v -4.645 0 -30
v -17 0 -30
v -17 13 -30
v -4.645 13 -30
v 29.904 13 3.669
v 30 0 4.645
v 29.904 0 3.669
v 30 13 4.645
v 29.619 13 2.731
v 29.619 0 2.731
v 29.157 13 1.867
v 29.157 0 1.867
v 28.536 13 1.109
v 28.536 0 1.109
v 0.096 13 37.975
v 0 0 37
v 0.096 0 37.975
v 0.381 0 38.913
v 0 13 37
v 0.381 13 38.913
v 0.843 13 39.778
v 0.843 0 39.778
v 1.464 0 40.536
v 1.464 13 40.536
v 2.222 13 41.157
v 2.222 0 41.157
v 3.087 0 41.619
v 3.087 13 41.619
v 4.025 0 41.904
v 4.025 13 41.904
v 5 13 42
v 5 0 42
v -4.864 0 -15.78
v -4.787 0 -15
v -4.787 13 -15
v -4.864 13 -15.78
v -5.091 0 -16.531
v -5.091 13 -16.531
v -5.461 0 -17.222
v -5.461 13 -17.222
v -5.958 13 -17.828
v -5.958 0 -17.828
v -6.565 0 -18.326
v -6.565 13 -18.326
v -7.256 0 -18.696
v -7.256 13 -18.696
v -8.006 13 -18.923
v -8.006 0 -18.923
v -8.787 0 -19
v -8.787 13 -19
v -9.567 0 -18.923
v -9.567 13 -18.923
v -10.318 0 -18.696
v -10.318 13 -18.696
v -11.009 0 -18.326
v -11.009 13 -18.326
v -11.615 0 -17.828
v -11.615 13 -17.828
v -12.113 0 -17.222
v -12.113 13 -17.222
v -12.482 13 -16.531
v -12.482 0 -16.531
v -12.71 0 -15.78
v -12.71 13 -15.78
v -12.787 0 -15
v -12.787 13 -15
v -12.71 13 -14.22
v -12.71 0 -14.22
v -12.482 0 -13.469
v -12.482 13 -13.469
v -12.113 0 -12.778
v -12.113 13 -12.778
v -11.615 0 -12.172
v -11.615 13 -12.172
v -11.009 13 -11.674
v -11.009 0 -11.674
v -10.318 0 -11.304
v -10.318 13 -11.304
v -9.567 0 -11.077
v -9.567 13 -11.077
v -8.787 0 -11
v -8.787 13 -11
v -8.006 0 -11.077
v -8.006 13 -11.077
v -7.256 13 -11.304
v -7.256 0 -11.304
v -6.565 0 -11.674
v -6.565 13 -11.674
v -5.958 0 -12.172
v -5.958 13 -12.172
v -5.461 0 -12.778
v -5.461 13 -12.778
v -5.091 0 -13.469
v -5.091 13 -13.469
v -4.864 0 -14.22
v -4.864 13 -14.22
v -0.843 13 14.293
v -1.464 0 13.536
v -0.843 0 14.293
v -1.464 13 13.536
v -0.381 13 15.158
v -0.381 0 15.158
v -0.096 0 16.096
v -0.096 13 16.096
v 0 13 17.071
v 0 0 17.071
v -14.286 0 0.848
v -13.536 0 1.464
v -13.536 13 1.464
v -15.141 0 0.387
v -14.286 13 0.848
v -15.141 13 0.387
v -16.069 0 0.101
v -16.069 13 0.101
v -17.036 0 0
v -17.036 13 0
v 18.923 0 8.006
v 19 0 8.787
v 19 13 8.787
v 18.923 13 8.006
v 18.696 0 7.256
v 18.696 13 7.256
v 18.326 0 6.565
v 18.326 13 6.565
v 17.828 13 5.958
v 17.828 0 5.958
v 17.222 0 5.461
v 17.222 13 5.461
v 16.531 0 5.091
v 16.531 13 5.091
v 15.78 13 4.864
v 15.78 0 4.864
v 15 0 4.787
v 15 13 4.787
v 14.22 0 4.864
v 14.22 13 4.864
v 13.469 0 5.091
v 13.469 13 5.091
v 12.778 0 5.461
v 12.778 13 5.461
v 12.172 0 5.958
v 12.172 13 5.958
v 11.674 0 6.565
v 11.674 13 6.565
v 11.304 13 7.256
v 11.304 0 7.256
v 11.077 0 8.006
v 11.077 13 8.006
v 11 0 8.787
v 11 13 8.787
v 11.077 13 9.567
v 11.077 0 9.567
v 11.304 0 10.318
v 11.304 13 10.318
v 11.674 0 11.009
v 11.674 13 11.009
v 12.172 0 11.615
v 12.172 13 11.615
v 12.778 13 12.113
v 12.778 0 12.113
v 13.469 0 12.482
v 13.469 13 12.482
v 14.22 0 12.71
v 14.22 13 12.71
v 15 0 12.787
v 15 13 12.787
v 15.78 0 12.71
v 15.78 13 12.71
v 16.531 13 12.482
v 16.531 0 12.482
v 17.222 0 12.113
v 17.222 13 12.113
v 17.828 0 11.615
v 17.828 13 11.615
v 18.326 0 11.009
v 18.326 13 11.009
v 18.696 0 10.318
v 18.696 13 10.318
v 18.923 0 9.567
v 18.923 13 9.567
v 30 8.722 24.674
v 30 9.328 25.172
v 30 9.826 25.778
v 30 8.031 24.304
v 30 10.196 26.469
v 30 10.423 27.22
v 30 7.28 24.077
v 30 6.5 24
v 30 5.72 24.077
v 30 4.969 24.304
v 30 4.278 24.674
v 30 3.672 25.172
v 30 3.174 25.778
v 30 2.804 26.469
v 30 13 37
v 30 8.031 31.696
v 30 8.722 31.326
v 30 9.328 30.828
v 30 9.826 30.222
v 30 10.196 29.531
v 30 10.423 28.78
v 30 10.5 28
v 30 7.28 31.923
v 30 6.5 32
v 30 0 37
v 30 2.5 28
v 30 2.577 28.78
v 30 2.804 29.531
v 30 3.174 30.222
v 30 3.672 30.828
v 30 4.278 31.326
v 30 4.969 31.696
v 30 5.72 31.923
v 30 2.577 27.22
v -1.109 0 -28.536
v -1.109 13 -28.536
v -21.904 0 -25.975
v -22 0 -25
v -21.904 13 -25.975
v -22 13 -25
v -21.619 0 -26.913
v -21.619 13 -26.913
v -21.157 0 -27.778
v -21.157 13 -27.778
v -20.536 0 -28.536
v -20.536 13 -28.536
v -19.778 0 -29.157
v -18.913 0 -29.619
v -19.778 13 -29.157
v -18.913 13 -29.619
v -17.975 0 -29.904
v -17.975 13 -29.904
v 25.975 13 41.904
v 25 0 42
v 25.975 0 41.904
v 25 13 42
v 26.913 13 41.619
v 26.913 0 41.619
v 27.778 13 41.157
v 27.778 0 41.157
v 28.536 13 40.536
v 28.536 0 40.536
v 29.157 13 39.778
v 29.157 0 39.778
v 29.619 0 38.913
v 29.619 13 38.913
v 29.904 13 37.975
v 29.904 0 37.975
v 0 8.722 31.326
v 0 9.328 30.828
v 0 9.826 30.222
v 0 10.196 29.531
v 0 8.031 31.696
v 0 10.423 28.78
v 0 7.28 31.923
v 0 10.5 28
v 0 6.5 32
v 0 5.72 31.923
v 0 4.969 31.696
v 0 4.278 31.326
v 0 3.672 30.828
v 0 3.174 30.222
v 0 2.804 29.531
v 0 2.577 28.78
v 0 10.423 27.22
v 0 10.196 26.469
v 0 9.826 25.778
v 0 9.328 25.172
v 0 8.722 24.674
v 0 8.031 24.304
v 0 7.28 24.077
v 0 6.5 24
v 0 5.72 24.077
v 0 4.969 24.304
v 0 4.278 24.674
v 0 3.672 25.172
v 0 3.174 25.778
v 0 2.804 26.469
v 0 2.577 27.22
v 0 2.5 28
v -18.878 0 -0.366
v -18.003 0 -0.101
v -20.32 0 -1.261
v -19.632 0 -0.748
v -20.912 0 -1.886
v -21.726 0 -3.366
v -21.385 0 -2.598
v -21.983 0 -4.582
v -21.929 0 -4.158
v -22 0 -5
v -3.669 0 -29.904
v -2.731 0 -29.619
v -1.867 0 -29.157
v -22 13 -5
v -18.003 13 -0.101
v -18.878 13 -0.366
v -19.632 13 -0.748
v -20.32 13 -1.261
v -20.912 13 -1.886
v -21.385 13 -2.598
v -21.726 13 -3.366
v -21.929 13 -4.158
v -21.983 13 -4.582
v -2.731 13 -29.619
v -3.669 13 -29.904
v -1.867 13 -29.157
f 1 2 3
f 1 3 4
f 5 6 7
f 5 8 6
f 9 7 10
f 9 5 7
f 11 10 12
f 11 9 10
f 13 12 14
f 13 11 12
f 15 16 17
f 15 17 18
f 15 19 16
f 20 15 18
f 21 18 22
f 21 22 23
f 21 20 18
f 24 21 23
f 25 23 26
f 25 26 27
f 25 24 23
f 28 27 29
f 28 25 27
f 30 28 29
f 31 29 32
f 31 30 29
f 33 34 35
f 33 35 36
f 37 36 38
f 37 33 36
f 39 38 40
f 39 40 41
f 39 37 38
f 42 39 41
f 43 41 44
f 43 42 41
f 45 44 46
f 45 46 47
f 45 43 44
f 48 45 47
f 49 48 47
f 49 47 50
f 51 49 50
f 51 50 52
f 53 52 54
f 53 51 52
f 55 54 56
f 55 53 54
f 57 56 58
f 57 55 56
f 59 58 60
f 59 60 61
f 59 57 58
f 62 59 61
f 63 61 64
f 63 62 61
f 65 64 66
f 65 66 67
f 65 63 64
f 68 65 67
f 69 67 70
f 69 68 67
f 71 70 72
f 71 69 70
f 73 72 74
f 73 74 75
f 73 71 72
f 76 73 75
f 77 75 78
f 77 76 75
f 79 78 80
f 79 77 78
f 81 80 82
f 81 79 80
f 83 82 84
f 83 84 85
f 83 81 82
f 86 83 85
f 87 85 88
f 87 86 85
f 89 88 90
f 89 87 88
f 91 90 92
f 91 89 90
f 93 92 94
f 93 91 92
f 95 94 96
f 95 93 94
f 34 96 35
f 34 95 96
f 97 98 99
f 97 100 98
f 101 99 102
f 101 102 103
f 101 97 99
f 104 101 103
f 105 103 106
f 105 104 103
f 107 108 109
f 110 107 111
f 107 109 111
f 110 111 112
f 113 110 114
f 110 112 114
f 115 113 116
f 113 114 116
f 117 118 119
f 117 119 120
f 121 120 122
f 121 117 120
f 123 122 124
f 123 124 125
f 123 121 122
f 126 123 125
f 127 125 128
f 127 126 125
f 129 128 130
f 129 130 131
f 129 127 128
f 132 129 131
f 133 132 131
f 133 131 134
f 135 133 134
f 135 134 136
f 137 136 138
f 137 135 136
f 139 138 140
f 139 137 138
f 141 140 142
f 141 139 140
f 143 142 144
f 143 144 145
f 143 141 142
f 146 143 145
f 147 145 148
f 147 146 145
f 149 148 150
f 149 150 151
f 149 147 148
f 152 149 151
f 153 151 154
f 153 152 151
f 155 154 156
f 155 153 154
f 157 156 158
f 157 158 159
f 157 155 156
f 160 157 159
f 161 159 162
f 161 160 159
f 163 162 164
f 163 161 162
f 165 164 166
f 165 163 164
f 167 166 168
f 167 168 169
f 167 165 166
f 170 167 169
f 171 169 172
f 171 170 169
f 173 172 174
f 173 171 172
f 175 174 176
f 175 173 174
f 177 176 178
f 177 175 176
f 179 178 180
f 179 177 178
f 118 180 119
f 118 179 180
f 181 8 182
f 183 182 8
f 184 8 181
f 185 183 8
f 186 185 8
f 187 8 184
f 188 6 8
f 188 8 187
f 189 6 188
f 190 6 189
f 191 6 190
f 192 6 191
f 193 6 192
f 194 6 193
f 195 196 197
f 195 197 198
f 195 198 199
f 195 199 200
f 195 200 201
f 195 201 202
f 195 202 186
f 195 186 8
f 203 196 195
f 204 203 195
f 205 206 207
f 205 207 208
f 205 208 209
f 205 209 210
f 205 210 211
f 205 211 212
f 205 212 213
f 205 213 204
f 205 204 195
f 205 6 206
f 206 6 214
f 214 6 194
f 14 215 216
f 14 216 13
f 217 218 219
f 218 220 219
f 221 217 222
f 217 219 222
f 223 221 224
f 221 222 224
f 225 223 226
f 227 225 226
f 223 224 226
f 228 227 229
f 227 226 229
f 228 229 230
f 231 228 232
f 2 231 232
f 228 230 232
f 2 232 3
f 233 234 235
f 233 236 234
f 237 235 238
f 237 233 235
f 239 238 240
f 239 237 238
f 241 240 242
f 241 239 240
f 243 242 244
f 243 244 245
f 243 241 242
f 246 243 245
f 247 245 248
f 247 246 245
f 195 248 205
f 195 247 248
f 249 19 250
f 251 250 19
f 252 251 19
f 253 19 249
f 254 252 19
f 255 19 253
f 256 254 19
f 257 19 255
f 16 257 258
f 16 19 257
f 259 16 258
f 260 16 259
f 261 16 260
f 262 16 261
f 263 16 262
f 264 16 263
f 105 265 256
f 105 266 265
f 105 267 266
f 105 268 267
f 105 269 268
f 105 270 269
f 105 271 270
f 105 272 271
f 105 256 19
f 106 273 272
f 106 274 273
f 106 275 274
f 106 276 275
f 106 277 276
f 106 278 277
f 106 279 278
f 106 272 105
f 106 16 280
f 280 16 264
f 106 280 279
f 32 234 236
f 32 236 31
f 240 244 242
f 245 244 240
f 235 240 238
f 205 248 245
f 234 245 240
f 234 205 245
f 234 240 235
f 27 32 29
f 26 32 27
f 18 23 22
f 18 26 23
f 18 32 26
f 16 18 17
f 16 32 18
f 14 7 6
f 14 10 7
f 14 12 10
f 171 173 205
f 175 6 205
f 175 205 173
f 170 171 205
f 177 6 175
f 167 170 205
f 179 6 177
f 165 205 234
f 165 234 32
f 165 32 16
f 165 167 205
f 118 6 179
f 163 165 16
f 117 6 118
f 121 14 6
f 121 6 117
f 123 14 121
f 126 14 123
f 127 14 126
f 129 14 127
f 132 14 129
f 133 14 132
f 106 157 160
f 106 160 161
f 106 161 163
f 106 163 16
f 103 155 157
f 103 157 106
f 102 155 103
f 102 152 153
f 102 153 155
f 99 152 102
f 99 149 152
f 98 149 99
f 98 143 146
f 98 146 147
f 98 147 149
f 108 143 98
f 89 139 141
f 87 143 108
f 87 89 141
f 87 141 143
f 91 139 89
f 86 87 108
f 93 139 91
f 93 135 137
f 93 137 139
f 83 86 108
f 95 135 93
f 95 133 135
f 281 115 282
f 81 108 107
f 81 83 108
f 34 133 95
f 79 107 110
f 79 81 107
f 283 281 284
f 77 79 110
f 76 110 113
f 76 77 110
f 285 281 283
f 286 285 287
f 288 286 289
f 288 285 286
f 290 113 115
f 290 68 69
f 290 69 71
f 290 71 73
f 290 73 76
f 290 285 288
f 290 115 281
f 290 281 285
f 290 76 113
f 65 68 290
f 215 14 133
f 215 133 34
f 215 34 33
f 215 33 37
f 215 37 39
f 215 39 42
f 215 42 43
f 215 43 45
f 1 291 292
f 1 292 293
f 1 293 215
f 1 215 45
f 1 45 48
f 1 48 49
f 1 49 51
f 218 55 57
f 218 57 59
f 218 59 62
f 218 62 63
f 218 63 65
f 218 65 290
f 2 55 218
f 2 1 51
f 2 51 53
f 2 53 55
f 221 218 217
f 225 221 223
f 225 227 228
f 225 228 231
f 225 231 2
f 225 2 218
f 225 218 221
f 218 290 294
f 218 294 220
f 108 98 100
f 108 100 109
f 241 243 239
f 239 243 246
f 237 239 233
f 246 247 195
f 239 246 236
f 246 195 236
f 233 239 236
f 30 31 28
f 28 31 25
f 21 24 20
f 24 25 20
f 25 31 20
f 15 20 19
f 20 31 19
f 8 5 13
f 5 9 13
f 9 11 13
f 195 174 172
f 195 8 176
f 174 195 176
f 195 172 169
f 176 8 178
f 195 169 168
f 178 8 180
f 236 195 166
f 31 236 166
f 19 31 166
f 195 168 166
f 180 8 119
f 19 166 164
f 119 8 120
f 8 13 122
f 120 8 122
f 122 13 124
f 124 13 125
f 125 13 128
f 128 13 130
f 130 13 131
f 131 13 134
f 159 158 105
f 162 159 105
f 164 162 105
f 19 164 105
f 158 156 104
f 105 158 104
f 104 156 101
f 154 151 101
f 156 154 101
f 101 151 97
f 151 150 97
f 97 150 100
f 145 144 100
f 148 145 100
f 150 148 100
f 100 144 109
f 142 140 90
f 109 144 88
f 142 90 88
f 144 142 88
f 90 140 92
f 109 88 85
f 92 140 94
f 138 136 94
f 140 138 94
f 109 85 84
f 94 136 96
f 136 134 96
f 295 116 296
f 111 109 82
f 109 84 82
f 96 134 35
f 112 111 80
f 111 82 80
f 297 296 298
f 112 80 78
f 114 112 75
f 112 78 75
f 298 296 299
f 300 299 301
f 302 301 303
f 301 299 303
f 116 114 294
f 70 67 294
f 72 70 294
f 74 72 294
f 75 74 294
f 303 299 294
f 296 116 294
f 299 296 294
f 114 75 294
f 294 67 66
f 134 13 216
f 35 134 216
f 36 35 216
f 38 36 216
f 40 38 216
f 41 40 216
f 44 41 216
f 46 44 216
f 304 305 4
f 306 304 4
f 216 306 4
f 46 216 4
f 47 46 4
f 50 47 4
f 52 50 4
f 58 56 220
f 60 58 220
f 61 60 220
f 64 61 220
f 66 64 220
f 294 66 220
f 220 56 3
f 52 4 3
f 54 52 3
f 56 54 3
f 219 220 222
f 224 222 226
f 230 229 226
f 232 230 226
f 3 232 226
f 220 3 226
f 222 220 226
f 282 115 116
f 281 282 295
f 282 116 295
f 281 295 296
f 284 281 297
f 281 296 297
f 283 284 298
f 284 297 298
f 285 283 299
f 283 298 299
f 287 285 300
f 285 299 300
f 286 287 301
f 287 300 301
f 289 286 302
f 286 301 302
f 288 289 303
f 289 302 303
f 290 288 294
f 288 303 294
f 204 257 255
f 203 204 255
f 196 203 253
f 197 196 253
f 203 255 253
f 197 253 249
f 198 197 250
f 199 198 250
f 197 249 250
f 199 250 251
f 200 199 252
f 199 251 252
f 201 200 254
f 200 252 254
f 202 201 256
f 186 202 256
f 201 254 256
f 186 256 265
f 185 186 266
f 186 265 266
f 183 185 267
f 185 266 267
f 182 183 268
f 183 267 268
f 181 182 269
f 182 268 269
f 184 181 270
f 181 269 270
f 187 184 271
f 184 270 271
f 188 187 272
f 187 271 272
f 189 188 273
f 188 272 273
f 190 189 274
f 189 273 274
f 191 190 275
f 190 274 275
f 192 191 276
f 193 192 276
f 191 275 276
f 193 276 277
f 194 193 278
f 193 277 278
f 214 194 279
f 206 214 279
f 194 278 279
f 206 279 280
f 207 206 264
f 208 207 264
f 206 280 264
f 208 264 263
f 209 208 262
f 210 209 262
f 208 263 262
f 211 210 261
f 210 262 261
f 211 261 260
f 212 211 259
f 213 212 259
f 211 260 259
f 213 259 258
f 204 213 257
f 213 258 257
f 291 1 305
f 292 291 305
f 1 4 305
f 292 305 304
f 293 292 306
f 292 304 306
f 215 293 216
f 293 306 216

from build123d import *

# Parameters (mm, degrees)
SKETCH1_R      = 4
EXTRUDE1_DEPTH = 13
FILLET5_R      = 5
FILLET6_R      = 5
SKETCH8_R      = 4
EXTRUDE7_DEPTH = 30


with BuildPart() as part:
    # Sketch1 → Extrude1 (new body)
    with BuildSketch(Plane(origin=(0, 0, 0), x_dir=(1, 0, 0), z_dir=(0, 1, 0))):
        Polygon((0, -15), (-15, 0), (-22, 0), (-22, 30), (-2.573593129, 30), (30, -2.573593129), (30, -42), (0, -42), align=None)
        with Locations((-8.786796564, 15)):
            Circle(SKETCH1_R, mode=Mode.SUBTRACT)
        with Locations((15, -8.786796564)):
            Circle(SKETCH1_R, mode=Mode.SUBTRACT)
    extrude(amount=EXTRUDE1_DEPTH)

    # Fillet5
    fillet5_edges = [part.edges().sort_by_distance(p)[0] for p in [
        (-2.573593129, 6.5, -30),
        (30, 6.5, 2.573593129),
        (30, 6.5, 42),
        (0, 6.5, 42),
        (0, 6.5, 15),
        (-15, 6.5, 0),
    ]]
    fillet(fillet5_edges, radius=FILLET5_R)

    # Fillet6
    fillet6_edges = [part.edges().sort_by_distance(p)[0] for p in [
        (-22, 6.5, 0),
        (-22, 6.5, -30),
    ]]
    fillet(fillet6_edges, radius=FILLET6_R)

    # Sketch8 → Extrude7 (cut)
    with BuildSketch(Plane.ZY):
        with Locations((28, 6.5)):
            Circle(SKETCH8_R)
    extrude(amount=-EXTRUDE7_DEPTH, mode=Mode.SUBTRACT)


solid = part.part
